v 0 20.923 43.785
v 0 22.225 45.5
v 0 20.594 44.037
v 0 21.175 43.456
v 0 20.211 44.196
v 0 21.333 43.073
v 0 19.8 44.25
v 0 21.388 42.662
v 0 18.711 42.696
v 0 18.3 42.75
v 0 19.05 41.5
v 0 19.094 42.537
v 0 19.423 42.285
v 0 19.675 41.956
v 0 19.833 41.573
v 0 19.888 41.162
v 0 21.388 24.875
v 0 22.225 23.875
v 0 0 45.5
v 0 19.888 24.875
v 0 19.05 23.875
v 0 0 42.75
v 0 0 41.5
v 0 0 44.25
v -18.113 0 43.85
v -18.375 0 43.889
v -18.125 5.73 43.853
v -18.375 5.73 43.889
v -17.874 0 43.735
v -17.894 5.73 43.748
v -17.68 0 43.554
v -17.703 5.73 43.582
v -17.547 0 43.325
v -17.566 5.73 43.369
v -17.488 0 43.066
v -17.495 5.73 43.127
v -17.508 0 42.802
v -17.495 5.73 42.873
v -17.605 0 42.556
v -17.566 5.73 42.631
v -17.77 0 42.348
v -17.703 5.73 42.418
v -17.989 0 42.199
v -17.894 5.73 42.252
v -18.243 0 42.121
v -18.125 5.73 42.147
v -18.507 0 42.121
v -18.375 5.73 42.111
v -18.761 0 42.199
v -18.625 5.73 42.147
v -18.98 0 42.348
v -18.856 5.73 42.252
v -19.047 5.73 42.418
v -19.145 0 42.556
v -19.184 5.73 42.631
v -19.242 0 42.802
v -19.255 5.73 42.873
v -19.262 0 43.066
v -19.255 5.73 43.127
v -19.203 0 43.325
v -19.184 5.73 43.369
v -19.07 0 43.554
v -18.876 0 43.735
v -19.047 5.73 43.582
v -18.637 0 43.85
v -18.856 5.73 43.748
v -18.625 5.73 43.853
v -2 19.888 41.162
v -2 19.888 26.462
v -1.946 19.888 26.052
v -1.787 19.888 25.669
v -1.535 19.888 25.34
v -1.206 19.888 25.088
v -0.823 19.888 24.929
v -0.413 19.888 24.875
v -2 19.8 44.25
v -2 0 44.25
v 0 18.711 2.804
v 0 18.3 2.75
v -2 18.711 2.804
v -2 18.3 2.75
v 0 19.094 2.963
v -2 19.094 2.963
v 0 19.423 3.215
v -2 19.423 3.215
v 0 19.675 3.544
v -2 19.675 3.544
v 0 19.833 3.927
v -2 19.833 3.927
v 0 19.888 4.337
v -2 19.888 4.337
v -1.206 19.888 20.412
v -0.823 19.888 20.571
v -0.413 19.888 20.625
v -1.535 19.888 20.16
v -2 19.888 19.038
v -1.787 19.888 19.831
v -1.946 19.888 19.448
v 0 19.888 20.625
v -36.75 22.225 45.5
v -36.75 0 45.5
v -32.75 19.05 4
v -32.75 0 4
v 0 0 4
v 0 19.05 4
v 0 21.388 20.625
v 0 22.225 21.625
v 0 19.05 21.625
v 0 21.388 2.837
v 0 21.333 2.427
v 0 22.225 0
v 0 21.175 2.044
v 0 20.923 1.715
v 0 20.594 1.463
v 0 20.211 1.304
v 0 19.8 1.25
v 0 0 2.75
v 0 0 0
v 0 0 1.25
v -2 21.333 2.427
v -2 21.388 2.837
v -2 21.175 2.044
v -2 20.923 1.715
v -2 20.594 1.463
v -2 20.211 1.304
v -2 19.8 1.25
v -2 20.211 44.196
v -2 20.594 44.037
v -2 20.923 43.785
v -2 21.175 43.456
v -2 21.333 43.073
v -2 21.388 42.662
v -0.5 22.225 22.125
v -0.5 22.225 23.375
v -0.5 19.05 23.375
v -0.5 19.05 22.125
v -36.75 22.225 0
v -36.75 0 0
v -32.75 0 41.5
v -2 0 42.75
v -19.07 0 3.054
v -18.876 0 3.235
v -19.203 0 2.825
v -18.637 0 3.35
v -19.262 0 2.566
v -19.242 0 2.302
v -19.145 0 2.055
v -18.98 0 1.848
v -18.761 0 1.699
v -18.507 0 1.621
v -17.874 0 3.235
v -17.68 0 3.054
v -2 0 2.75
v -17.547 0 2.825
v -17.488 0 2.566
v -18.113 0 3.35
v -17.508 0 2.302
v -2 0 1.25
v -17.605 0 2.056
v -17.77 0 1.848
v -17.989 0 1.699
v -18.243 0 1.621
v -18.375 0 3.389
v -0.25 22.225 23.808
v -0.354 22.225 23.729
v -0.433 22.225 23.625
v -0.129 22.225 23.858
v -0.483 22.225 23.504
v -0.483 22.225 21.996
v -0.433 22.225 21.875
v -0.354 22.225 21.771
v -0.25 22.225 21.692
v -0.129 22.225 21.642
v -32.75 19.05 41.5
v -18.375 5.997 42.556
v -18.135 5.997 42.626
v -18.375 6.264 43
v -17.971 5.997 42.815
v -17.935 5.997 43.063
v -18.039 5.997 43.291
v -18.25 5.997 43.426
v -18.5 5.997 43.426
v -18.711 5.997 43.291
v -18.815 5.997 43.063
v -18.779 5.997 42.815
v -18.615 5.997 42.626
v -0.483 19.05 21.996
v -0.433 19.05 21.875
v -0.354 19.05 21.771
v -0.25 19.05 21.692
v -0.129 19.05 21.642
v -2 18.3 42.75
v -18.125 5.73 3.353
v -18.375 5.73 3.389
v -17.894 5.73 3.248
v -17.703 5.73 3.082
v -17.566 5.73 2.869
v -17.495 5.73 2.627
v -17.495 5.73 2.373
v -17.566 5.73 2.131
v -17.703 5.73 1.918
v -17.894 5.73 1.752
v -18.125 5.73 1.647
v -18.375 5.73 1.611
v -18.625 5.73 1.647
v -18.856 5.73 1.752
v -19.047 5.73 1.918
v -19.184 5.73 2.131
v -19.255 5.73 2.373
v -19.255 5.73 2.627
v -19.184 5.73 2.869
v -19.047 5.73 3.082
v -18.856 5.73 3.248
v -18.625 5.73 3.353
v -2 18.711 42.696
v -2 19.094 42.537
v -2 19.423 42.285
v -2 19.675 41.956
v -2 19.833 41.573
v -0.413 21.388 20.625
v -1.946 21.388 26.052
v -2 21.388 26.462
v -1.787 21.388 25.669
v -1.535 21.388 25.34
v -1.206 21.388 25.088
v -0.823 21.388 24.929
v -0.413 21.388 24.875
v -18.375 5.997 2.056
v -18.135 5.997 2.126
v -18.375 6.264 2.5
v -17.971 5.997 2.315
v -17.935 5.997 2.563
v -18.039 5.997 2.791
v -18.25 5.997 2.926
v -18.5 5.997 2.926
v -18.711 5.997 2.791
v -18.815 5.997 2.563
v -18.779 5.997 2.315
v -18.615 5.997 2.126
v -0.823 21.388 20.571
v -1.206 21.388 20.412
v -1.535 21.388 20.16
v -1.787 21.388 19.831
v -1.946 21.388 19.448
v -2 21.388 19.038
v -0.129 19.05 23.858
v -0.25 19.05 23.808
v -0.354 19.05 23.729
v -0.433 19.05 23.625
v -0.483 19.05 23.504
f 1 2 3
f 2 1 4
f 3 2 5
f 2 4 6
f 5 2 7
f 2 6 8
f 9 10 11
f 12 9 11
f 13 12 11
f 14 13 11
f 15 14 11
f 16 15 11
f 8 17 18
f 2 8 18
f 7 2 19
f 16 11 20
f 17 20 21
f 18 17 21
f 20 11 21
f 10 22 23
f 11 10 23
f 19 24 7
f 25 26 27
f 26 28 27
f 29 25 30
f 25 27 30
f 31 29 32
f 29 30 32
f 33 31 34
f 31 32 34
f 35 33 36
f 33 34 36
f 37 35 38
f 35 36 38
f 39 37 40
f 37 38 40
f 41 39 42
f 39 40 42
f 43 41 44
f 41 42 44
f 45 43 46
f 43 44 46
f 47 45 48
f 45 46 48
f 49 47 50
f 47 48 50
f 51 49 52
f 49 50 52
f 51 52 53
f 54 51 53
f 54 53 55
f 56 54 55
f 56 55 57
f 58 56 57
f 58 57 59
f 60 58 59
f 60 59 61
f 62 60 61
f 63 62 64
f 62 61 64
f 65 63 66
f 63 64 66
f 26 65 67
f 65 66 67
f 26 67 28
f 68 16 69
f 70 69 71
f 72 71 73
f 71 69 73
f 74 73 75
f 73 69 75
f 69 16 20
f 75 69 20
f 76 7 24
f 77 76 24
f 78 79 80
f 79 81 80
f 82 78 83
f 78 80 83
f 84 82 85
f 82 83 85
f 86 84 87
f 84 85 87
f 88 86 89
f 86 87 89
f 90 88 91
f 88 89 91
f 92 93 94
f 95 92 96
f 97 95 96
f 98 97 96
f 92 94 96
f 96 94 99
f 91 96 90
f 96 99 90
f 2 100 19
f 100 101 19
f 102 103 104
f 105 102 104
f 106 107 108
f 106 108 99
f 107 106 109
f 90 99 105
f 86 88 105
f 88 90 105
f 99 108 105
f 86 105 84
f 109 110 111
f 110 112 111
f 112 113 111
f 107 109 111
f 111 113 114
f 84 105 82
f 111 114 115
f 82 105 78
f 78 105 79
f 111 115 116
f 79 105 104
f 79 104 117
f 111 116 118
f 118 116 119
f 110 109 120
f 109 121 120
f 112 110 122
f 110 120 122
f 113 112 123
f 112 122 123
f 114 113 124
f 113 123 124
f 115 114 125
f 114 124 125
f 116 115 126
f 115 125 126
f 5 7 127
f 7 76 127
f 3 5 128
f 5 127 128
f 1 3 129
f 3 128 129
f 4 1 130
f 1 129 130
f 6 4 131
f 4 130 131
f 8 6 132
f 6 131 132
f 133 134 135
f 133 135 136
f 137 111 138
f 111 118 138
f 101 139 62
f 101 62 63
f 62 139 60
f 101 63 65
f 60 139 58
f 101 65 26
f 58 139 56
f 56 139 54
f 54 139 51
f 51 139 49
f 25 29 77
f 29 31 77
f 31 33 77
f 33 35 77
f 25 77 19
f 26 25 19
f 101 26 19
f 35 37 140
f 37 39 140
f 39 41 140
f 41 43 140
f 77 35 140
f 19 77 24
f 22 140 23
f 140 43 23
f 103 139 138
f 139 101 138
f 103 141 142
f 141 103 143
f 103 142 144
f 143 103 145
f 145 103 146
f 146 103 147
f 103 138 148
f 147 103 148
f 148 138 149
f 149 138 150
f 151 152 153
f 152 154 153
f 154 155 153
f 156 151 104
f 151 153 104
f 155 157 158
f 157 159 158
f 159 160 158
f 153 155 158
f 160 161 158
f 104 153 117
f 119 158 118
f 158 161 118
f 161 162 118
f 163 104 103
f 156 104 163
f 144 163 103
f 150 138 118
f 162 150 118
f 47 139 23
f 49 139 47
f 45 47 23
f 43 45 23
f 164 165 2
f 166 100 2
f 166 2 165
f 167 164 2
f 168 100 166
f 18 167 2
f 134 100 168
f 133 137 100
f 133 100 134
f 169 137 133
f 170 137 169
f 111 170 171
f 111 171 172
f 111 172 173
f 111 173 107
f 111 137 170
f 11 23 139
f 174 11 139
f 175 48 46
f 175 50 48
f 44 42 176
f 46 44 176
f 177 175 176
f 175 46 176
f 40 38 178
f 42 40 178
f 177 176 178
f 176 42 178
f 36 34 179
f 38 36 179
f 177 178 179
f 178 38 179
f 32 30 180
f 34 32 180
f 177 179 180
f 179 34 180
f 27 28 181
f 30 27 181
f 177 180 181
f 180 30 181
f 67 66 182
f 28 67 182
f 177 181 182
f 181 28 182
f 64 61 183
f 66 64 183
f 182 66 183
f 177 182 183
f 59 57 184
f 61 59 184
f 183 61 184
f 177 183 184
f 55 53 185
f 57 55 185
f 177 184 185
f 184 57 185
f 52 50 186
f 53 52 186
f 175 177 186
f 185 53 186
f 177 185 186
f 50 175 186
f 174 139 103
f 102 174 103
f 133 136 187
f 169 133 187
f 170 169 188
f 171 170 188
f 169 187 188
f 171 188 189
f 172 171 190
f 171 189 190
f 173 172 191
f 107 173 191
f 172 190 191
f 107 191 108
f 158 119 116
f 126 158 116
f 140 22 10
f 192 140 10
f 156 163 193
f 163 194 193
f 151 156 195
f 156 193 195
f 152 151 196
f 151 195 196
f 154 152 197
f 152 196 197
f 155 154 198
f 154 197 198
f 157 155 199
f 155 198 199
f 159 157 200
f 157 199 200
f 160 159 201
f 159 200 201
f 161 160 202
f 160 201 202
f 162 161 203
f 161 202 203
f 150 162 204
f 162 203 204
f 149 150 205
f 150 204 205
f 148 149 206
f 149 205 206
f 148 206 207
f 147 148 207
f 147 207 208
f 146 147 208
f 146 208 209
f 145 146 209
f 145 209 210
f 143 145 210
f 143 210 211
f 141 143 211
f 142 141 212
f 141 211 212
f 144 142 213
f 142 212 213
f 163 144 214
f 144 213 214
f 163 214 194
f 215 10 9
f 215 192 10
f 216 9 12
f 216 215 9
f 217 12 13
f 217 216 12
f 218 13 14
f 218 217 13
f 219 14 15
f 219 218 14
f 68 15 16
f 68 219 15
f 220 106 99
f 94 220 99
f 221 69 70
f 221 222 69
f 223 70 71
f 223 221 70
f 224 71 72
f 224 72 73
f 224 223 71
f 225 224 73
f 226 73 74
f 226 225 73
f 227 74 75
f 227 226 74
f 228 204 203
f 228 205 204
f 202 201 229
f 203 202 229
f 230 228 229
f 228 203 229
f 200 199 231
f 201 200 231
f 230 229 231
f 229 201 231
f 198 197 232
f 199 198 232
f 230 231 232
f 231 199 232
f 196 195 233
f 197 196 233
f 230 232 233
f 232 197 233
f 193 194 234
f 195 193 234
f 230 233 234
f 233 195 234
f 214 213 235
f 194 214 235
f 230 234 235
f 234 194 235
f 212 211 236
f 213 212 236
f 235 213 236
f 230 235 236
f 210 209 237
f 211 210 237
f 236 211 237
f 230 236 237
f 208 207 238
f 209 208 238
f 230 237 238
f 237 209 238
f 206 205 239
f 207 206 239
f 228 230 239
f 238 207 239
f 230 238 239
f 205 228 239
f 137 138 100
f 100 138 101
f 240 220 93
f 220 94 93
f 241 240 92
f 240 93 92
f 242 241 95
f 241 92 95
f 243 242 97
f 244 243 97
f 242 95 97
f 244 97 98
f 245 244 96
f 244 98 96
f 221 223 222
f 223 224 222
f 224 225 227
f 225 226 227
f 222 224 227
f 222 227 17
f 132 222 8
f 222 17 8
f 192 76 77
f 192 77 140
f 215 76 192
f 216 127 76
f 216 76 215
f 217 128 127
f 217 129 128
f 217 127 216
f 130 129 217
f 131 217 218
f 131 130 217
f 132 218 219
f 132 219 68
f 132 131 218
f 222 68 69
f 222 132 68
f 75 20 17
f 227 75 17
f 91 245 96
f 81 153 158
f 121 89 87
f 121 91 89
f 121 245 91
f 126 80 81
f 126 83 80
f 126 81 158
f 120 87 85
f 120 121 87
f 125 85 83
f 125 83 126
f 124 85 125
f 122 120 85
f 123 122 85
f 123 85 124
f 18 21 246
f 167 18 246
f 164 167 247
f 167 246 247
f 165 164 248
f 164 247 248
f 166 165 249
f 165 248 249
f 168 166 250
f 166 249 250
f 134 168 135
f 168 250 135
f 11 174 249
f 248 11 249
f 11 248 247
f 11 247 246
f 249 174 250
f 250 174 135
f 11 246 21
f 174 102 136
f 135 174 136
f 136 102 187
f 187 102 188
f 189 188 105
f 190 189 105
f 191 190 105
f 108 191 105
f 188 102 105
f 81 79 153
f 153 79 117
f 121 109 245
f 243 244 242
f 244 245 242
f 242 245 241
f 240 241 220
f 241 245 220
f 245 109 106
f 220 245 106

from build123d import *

# Parameters (mm, degrees)
WALL_DEPTH                = 19.05
ROOF_START                = 19.05
ROOF_DEPTH                = 3.175
F_2_56_TAPPED_HOLE1_D     = 1.778
F_2_56_TAPPED_HOLE1_DEPTH = 5.73
F_2_56_TAPPED_HOLE1_TIP   = 0.53416509
F_2MM_DEPTH_CUT_DEPTH     = 2
F_1_16_IN_FILLET_R        = 1.5875


with BuildPart() as part:
    # MainSketch → Wall (new body)
    with BuildSketch(Plane(origin=(0, 0, 0), x_dir=(1, 0, 0), z_dir=(0, 1, 0))):
        Polygon((-32.75, -4), (0, -4), (0, 0), (-36.75, 0), (-36.75, -45.5), (0, -45.5), (0, -41.5), (-32.75, -41.5), align=None)
    extrude(amount=WALL_DEPTH)

    # MainSketch<3> → Roof (add)
    with BuildSketch(Plane(origin=(0, 0, 0), x_dir=(1, 0, 0), z_dir=(0, 1, 0)).offset(ROOF_START)):
        with BuildLine():
            Line((0, -21.625), (0, 0))
            Line((0, 0), (-36.75, 0))
            Line((-36.75, 0), (-36.75, -45.5))
            Line((-36.75, -45.5), (0, -45.5))
            Line((0, -45.5), (0, -23.875))
            ThreePointArc((0, -23.875), (-0.353553391, -23.728553391), (-0.5, -23.375))
            Line((-0.5, -23.375), (-0.5, -22.125))
            ThreePointArc((-0.5, -22.125), (-0.353553391, -21.771446609), (0, -21.625))
        make_face()
    extrude(amount=ROOF_DEPTH)

    # #2-56 Tapped Hole1
    with Locations(Plane(origin=(-18.375, 0, 2.5), x_dir=(0, 0, -1), z_dir=(0, -1, 0))):
        with Locations((0, 0), (-40.5, 0)):
            Hole(F_2_56_TAPPED_HOLE1_D / 2, depth=F_2_56_TAPPED_HOLE1_DEPTH)
            with Locations((0, 0, -(F_2_56_TAPPED_HOLE1_DEPTH + F_2_56_TAPPED_HOLE1_TIP / 2))):  # 118° drill point
                Cone(0, F_2_56_TAPPED_HOLE1_D / 2, F_2_56_TAPPED_HOLE1_TIP, mode=Mode.SUBTRACT)

    # Sketch3 → 2mm depth cut (cut)
    with BuildSketch(Plane(origin=(0, 0, 0), x_dir=(0, 0, -1), z_dir=(1, 0, 0))):
        Polygon((-44.25, 21.3875), (-44.25, 0), (-42.75, 0), (-42.75, 19.8875), (-24.875, 19.8875), (-24.875, 21.3875), align=None)
        Polygon((-1.25, 21.3875), (-20.625, 21.3875), (-20.625, 19.8875), (-2.75, 19.8875), (-2.75, 0), (-1.25, 0), align=None)
    extrude(amount=-F_2MM_DEPTH_CUT_DEPTH, mode=Mode.SUBTRACT)

    # 1/16 in fillet
    f_1_16_in_fillet_edges = [part.edges().sort_by_distance(p)[0] for p in [
        (-1, 19.8875, 42.75),
        (-1, 21.3875, 44.25),
        (-2, 20.6375, 24.875),
        (-1, 21.3875, 1.25),
        (-1, 19.8875, 2.75),
        (-2, 20.6375, 20.625),
    ]]
    fillet(f_1_16_in_fillet_edges, radius=F_1_16_IN_FILLET_R)


solid = part.part
